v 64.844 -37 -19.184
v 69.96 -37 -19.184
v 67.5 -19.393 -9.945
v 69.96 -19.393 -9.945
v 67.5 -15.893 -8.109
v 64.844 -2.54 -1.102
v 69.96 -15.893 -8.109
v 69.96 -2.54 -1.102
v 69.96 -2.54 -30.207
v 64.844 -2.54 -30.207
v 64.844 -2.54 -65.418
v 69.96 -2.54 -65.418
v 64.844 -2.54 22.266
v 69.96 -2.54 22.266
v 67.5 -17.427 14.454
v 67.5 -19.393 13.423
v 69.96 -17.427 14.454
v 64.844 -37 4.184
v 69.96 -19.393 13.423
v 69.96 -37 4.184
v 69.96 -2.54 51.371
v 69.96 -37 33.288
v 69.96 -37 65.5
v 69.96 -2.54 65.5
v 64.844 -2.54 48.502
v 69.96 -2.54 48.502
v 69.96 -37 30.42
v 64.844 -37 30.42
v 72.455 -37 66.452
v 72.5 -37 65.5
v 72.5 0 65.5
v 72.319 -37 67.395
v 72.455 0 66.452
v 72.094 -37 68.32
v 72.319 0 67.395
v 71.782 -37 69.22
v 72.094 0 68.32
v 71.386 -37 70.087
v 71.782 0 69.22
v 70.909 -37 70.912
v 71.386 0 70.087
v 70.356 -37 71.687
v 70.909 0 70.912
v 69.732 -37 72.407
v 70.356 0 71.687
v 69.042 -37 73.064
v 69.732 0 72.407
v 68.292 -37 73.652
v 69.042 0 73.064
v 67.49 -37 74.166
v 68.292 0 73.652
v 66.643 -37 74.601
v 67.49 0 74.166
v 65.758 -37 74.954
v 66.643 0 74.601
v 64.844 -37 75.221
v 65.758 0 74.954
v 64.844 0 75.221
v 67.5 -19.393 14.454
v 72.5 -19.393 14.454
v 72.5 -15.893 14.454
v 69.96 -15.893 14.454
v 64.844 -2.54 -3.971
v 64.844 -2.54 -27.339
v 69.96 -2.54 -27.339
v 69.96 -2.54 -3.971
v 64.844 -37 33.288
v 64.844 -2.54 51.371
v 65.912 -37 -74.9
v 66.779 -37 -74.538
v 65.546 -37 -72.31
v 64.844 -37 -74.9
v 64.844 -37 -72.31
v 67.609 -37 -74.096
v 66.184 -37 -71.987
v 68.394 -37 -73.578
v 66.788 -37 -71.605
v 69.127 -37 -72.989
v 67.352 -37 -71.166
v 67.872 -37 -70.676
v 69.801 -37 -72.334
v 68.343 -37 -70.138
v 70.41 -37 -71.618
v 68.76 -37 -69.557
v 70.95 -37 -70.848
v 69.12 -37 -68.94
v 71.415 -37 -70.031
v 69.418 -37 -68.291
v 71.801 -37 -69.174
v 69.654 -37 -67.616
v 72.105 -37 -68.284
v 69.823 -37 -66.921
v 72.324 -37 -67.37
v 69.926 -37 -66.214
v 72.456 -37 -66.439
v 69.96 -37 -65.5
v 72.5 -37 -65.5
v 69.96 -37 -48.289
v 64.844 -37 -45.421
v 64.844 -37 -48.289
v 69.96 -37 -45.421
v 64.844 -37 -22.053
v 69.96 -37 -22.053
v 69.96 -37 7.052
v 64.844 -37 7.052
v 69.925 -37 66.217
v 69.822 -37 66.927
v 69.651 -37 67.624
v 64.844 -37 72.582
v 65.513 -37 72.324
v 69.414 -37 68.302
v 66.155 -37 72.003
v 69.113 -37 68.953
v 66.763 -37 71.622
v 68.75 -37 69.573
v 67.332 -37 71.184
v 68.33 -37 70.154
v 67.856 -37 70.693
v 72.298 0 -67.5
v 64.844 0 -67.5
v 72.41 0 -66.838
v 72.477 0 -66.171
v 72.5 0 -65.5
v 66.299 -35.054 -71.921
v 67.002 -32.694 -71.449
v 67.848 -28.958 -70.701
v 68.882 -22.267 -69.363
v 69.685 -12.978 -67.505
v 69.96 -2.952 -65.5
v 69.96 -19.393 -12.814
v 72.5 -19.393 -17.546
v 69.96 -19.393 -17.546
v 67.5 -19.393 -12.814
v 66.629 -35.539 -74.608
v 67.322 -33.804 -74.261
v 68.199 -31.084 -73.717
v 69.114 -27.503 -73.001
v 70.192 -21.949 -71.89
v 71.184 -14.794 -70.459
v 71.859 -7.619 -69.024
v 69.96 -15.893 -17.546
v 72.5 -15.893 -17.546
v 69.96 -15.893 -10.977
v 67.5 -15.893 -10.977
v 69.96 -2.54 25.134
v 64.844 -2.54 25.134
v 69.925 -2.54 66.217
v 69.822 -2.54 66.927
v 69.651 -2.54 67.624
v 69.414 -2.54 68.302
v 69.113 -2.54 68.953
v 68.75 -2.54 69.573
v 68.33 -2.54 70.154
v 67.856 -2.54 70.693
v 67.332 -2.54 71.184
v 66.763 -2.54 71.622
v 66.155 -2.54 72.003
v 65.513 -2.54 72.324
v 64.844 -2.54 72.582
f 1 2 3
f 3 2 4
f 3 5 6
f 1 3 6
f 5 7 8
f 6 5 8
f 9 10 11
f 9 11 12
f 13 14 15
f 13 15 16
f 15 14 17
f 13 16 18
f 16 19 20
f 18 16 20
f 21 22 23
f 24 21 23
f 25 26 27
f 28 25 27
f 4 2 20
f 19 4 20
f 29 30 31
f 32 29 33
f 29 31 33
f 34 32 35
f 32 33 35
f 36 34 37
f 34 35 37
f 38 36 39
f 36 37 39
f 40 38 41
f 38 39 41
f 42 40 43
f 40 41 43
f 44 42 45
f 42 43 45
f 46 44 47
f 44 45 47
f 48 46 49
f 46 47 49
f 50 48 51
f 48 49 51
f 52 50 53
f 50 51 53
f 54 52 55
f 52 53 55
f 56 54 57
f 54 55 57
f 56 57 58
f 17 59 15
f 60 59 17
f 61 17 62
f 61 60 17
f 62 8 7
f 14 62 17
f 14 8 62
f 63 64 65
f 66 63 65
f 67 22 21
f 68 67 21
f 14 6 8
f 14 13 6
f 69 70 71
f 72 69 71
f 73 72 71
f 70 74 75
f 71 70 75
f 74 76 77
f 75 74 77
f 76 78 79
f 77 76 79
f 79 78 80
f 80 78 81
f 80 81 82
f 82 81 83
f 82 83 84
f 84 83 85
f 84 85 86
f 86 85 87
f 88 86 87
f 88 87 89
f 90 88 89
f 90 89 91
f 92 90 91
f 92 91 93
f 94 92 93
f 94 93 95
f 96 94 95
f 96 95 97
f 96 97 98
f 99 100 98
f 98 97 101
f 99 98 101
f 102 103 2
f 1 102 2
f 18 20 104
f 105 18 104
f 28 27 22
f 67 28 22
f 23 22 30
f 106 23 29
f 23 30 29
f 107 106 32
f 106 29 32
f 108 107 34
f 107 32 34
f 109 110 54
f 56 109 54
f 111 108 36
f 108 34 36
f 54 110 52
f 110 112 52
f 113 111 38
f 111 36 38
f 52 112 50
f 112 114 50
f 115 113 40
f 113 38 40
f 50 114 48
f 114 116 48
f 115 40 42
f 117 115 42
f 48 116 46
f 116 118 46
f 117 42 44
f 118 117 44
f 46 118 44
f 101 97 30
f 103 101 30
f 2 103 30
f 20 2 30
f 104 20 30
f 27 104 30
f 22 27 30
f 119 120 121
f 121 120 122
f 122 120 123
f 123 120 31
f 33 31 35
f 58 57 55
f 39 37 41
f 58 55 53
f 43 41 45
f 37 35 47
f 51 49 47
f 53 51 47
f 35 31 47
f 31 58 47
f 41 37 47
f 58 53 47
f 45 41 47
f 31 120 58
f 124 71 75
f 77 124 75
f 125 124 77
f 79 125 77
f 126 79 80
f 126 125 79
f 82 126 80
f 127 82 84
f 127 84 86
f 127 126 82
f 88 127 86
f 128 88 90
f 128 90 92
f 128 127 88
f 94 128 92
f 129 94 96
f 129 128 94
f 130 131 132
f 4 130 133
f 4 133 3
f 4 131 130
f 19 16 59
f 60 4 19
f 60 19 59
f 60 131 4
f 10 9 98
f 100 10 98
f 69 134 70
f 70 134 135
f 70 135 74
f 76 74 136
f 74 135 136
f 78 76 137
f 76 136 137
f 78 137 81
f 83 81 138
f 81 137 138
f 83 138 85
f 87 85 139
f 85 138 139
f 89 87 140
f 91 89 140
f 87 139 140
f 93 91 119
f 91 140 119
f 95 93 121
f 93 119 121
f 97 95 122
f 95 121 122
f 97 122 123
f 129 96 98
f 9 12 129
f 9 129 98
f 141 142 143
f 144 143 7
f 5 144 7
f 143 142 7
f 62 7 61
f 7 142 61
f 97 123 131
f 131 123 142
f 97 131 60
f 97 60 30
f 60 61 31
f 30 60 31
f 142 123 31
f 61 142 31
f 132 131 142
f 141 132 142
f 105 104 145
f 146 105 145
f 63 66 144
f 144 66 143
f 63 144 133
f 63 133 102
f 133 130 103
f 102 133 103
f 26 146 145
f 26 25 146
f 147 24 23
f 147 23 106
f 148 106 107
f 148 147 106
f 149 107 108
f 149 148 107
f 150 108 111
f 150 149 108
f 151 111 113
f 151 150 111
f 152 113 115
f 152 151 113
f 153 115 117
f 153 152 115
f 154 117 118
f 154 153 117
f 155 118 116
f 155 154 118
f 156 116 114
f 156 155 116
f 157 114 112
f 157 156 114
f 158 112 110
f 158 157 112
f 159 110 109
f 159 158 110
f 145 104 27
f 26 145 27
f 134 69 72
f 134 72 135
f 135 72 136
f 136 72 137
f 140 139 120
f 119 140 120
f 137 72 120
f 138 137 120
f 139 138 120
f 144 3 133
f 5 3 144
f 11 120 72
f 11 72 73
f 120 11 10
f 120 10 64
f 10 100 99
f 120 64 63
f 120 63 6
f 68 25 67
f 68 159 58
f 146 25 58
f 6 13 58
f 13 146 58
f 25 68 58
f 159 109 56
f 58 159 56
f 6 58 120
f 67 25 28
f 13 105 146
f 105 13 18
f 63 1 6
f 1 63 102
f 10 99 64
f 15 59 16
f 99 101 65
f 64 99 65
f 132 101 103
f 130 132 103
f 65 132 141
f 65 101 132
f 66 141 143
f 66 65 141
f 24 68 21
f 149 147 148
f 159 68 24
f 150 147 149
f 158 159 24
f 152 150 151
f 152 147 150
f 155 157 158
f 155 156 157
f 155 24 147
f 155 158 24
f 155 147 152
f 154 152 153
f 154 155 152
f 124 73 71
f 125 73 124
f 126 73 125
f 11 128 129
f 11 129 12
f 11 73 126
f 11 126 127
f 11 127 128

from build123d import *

# Parameters (mm, degrees)
F1_DEPTH    = 37
F2_T1_DEPTH = 342.8505669038
F3_T        = -2.54
F4_W        = 125.55387271
F4_H        = 111.9176980871
F5_DEPTH    = 25.4
F6_R        = 3.175
F7_DEPTH    = 19.05
F9_DEPTH    = 142.24
F10_W       = 3.5
F10_H       = 32
F11_DEPTH   = 5
F12_W       = 142.5411626697
F12_H       = 154.7065079212
F13_DEPTH   = 37.001


# Not quite as in the source:
# - a fillet or chamfer that OpenCascade refuses, or shapes differently, is made with other operations: its cross-section is extruded or revolved along the edge and cut away or added


with BuildPart() as f1:
    # F0 (on Front) → F1 (new body)
    with BuildSketch(Plane.XZ):
        with BuildLine():
            Line((62.5, 75.5), (-72.5, 75.5))
            Line((-72.5, 75.5), (-72.5, -75.5))
            Line((-72.5, -75.5), (62.5, -75.5))
            ThreePointArc((62.5, -75.5), (69.5710678119, -72.5710678119), (72.5, -65.5))
            Line((72.5, -65.5), (72.5, 65.5))
            ThreePointArc((72.5, 65.5), (69.5710678119, 72.5710678119), (62.5, 75.5))
        make_face()
    extrude(amount=F1_DEPTH)

    # F2: chamfer of 40 x 8 on 1 edges, made by hand

    # F2_s2 → F2_t1 (cut)
    with BuildSketch(Plane.YZ.offset(-176.4252834519)):
        Polygon((-40, -75.5), (0, -67.5), (0, -75.5), align=None)
    extrude(amount=F2_T1_DEPTH, mode=Mode.SUBTRACT)

    # F3
    f3_openings = [f1.faces().sort_by_distance(p)[0] for p in [
        (-0.123954, -37, 0.284541),
    ]]
    offset(amount=F3_T, openings=f3_openings)

    # F4 (on face) → F5 (cut)
    with BuildSketch(Plane.XZ.offset(2.54)):
        with Locations((-0.276936355, 9.5411509565)):
            Rectangle(F4_W, F4_H)
    extrude(amount=-F5_DEPTH, mode=Mode.SUBTRACT)

    # F6 (on face) → F7 (cut)
    with BuildSketch(Plane(origin=(-72.5, 0, 0), x_dir=(0, -1, 0), z_dir=(-1, 0, 0))):
        with Locations((21.3561020792, 0)):
            Circle(F6_R)
        with Locations((21.3561020792, 35)):
            Circle(F6_R)
        with Locations((21.3561020792, -30)):
            Circle(F6_R)
    extrude(amount=-F7_DEPTH, mode=Mode.SUBTRACT)

    # F8 (on face) → F9 (join)
    with BuildSketch(Plane(origin=(69.96, 0, 0), x_dir=(0, -1, 0), z_dir=(-1, 0, 0))):
        Polygon((0, -28.8742875891), (37, -48.2893098931), (37, -45.4208615419), (0, -26.005839238), align=None)
        Polygon((0, -2.637839238), (37, -22.0528615419), (37, -19.1844131908), (0, 0.2306091132), align=None)
        Polygon((0, 23.5986091132), (37, 4.1835868092), (37, 7.0520351604), (0, 26.4670574643), align=None)
        Polygon((0, 49.8350574643), (37, 30.4200351604), (37, 33.2884835115), (0, 52.7035058155), align=None)
    extrude(amount=F9_DEPTH)

    # F10 (on face) → F11 (cut)
    with BuildSketch(Plane.YZ.offset(72.5)):
        with Locations((-17.6429149747, -1.5458973408)):
            Rectangle(F10_W, F10_H)
    extrude(amount=-F11_DEPTH, mode=Mode.SUBTRACT)

    # F12 (on face) → F13 (cut, through all)
    with BuildSketch(Plane.XZ.offset(37)):
        with Locations((-6.4269788563, 0.7590651512)):
            Rectangle(F12_W, F12_H)
    extrude(amount=-F13_DEPTH, mode=Mode.SUBTRACT)


solid = f1.part
